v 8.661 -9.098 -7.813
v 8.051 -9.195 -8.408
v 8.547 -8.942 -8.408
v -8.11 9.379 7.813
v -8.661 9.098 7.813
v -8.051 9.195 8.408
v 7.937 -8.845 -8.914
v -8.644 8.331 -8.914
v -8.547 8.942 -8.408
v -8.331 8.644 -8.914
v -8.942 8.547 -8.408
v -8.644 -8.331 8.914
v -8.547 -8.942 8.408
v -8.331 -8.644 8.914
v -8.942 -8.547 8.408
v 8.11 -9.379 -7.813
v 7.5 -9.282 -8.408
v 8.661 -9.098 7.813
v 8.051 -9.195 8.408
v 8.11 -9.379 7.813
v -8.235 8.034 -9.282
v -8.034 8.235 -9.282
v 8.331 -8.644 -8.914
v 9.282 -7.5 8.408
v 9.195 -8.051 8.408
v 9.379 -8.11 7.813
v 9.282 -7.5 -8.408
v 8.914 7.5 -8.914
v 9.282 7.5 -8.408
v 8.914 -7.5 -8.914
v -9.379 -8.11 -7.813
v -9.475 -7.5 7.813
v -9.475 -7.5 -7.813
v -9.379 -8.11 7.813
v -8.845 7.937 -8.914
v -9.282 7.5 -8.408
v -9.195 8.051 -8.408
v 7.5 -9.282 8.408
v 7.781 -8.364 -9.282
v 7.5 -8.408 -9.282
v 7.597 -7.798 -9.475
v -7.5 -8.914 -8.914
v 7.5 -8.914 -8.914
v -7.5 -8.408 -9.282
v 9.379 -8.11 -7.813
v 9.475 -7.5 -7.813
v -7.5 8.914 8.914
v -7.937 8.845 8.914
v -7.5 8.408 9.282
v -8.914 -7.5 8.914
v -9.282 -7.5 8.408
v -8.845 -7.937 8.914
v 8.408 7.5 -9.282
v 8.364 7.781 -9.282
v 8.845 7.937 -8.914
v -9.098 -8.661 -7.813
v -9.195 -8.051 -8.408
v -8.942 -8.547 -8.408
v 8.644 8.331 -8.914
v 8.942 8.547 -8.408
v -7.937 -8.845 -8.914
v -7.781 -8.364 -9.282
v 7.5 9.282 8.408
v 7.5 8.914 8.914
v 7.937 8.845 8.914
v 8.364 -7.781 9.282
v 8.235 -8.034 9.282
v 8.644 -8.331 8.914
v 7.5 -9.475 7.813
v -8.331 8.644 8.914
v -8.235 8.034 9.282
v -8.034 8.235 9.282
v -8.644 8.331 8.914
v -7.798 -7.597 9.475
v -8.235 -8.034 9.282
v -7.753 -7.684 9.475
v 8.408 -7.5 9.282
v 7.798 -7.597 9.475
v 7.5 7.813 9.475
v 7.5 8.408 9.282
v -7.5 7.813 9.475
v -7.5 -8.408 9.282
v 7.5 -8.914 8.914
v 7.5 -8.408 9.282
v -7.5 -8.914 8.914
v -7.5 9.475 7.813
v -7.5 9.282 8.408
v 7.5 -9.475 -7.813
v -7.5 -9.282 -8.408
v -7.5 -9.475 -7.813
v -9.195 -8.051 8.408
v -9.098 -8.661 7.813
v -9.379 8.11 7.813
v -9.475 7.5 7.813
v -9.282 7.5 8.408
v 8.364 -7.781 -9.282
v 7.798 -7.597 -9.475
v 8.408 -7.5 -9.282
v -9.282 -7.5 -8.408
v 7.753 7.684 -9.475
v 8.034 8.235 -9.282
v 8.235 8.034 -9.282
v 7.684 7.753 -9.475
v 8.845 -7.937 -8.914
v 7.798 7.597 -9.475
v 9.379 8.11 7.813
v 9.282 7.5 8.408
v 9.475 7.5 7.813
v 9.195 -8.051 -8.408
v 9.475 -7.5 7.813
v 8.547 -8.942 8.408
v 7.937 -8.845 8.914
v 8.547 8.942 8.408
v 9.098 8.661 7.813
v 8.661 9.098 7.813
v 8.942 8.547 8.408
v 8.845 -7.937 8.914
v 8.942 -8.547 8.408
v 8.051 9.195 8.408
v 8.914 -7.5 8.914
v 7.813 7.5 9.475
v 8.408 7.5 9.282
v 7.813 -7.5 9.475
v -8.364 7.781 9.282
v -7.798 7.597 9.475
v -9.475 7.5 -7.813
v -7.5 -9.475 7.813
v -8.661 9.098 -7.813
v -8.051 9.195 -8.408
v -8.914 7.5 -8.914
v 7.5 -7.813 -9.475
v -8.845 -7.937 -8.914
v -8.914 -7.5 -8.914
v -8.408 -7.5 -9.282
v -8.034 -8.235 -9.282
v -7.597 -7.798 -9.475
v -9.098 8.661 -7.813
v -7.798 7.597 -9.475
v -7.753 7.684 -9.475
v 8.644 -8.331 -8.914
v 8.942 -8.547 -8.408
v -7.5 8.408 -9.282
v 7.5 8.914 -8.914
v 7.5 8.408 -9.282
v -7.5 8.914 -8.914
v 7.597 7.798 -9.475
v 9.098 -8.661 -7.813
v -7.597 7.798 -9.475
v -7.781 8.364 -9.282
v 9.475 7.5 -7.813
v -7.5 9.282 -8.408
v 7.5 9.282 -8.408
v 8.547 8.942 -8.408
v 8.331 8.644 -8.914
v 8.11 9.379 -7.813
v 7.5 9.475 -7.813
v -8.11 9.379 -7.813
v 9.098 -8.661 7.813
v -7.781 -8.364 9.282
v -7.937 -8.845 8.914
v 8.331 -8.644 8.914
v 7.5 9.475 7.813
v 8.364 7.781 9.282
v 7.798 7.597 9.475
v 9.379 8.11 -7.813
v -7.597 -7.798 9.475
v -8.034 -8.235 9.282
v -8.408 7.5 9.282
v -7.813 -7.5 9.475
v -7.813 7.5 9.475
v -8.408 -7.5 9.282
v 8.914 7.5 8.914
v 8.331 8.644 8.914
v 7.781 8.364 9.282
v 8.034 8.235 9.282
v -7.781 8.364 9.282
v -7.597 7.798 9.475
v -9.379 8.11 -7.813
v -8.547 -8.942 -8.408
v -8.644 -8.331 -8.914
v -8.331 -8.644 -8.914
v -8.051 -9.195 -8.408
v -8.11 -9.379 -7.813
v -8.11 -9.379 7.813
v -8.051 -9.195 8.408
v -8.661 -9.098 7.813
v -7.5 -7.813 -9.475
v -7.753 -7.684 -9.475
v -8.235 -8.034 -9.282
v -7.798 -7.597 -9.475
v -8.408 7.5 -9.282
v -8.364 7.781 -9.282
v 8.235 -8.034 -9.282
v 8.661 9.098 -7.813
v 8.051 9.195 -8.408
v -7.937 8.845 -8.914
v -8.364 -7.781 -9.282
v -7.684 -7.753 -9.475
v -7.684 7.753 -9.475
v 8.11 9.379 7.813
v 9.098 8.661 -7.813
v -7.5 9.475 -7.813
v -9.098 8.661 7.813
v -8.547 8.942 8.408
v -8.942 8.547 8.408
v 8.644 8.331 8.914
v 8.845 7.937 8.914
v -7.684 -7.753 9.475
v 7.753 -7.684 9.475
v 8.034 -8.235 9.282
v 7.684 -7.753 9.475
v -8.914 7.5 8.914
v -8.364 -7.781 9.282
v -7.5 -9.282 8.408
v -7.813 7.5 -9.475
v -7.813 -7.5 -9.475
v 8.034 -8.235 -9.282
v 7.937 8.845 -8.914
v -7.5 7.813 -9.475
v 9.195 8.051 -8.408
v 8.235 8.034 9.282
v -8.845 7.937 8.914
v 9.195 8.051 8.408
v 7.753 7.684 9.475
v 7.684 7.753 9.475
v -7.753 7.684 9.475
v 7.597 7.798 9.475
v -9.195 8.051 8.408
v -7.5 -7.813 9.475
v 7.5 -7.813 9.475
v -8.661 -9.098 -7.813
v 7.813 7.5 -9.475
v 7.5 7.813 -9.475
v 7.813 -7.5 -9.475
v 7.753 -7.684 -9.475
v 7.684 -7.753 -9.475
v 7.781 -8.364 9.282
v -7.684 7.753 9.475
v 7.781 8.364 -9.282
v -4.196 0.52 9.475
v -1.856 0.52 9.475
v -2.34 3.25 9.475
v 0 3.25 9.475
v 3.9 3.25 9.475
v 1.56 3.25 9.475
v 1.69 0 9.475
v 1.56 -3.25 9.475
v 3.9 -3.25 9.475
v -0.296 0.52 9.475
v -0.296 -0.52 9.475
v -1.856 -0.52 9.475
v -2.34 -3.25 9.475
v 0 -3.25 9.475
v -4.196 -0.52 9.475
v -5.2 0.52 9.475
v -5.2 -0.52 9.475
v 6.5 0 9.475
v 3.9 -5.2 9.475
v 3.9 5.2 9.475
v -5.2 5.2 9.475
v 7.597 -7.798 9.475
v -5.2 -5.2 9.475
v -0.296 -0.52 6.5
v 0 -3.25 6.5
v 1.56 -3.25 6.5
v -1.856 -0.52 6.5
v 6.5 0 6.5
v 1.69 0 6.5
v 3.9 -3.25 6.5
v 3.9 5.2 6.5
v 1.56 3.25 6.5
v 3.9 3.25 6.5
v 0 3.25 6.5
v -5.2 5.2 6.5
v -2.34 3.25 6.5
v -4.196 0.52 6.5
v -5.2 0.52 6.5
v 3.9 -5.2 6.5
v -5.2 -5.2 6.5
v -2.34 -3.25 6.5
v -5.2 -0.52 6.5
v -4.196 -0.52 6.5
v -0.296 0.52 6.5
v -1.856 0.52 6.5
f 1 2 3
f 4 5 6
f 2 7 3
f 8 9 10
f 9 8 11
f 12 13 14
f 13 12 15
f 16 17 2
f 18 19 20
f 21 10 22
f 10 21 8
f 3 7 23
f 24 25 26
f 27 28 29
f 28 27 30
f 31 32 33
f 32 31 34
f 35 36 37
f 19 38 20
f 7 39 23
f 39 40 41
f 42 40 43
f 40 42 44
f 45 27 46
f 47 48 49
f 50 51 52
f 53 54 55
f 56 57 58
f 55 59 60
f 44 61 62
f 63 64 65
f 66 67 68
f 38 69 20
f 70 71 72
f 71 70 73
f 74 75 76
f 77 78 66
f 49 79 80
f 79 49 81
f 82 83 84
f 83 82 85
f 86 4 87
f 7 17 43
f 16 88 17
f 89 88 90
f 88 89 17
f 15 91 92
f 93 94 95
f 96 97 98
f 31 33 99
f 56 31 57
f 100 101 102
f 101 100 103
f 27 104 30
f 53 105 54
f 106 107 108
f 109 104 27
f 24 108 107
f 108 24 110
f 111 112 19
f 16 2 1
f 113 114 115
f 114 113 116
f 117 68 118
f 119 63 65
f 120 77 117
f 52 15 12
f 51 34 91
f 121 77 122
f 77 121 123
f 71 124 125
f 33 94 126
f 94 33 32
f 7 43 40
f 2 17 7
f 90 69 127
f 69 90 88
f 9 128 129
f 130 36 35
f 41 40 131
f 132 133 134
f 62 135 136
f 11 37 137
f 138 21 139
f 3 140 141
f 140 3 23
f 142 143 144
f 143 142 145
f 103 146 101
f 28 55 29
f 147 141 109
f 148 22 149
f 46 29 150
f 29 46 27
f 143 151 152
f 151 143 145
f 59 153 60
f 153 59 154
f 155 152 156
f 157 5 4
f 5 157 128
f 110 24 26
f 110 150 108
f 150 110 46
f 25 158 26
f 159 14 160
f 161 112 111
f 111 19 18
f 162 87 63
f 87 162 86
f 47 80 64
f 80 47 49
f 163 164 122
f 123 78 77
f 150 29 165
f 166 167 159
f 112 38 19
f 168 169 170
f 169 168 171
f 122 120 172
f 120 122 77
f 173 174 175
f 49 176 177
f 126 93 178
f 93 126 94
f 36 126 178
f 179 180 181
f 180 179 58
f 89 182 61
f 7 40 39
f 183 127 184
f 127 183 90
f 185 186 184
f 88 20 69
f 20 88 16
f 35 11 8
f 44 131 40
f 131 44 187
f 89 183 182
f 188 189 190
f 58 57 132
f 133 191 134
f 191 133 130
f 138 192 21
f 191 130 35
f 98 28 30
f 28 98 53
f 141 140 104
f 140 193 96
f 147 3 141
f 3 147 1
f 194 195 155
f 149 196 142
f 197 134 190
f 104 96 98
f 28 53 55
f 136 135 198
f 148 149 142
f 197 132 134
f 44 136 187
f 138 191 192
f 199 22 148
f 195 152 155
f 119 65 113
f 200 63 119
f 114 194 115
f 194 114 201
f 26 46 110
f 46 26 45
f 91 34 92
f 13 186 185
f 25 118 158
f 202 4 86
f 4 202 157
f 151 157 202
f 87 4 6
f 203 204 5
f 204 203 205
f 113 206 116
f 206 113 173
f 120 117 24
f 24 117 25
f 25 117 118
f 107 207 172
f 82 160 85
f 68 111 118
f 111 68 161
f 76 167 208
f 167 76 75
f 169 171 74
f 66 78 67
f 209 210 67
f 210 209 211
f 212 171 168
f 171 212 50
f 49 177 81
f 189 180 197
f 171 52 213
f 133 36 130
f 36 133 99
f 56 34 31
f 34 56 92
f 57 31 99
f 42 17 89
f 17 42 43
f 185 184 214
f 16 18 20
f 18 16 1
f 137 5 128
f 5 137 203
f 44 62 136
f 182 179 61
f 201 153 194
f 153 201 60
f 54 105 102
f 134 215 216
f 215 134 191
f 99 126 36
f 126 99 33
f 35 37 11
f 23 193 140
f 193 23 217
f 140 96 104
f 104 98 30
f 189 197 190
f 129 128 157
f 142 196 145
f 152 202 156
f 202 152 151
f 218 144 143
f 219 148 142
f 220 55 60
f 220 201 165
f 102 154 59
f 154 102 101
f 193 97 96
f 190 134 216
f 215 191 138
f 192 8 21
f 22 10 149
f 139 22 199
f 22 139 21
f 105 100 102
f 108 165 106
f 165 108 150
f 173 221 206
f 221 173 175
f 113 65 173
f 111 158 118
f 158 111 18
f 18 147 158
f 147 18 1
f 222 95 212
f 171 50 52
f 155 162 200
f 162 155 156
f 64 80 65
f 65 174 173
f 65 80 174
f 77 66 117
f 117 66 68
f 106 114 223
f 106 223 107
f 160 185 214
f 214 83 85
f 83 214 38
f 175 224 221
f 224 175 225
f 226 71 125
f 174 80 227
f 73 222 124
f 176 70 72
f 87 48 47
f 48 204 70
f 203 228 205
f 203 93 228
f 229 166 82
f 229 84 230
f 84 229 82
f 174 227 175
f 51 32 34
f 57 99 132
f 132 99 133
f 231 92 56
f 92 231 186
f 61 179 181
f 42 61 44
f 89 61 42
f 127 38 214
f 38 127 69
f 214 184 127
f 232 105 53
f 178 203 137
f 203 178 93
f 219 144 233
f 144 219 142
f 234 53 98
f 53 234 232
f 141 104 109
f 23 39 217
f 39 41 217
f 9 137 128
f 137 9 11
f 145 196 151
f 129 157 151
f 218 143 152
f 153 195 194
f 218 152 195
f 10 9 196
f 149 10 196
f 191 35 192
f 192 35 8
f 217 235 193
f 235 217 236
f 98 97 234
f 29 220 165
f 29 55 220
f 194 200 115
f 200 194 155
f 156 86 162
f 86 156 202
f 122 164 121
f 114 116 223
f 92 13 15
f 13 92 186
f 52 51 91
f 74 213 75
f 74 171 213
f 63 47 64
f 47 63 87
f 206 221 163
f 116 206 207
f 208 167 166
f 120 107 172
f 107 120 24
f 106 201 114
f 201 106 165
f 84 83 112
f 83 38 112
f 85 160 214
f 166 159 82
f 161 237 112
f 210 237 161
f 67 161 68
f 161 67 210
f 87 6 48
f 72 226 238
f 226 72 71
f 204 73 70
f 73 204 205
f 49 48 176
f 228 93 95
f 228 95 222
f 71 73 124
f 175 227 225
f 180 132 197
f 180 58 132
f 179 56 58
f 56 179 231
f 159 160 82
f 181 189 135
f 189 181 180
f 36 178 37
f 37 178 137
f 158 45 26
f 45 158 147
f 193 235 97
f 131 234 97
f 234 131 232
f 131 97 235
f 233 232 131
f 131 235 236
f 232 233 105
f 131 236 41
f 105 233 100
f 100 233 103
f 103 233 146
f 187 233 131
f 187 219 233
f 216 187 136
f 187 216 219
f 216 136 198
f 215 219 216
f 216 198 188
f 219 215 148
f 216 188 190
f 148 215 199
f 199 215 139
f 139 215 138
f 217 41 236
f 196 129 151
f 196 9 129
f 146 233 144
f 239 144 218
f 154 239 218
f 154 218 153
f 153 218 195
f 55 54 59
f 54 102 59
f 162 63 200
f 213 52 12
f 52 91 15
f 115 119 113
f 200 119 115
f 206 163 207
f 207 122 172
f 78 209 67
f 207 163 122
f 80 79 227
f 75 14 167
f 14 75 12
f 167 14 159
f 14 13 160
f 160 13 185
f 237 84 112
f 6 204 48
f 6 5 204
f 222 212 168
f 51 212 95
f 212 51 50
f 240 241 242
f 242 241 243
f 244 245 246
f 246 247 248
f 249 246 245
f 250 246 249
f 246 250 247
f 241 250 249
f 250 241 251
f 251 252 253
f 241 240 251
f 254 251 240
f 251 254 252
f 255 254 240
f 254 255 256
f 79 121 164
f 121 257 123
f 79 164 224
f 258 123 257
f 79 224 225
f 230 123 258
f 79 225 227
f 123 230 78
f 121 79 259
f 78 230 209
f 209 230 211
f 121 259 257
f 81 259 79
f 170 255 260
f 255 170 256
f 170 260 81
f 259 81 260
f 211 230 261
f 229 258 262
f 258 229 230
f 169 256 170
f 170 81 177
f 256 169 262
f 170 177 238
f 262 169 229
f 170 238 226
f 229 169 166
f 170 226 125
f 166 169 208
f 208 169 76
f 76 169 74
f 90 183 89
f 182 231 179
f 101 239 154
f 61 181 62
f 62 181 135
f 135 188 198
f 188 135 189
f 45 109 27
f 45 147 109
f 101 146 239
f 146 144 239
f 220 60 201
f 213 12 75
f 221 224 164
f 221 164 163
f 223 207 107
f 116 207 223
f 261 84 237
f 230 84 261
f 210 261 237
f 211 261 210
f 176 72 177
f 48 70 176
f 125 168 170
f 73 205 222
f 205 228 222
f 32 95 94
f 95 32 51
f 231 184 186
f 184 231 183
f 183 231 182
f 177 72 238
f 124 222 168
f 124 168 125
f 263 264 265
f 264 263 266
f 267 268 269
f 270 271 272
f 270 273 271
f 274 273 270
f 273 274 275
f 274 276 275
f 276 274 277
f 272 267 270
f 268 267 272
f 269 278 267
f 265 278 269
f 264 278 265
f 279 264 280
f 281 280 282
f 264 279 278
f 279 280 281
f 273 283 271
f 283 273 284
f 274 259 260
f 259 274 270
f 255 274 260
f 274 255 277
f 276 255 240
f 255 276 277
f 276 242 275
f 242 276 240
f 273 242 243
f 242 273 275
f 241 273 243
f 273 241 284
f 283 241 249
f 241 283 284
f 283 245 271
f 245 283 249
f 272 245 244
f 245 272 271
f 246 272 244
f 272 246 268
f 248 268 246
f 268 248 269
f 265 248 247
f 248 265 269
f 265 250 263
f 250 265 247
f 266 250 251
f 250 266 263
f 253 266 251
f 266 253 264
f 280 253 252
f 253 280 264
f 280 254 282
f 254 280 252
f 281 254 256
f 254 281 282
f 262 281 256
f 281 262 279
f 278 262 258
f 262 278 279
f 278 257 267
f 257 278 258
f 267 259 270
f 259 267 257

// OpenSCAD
eps = 0.0001;
$fn = 20;

cube_side = 19;
chamfer = 2;
engrave = 3;

module cube() {
  hull()
    for (a = [-1, 1], b = [-1, 1], c = [-1, 1])
      scale([a, b, c])
        translate((cube_side/2 - chamfer) * [1, 1, 1])
          sphere(chamfer);
}

module bullet_2d() {
  width = 3;
  length = 9.5;
  gap = 0.8;
  
  translate([3 - length/2, 0]) {
    scale([2, 1]) {
      intersection() {
        circle(d=width);
        translate([-width/2, 0])
          square(width, center=true);
      }
    }
    
    translate([gap, -width/2])
      square([length - width - gap, width]);
  }
}

module sword_2d() {  
  // Blade and hilt.
  polygon([
    [1, -2],
    [1, 5.5],
    [0, 7.5],
    [-1, 5.5],
    [-1, -2],
  ]);
  
  // Crossguard.
  polygon([
    [-2, -0.5],
    [-2, -2],
    [2, -2],
    [2, -0.5],
  ]);
  for (a = [-1, 1])
    scale([a, 1, 1])
      translate([2, -1.25, 0])
        circle(r=0.75);
  
  // Scalloped grip.
  for (y = [0.4, 1.6, 2.8])
    translate([0, -y-2.4])
      square([2, 0.8], center=true);
}

module tooth_2d() {
  size = 3;
  
  translate([-1, 0]) {
    intersection() {
      polygon([
        [0, 0],
        [size, 0],
        [0, size],
      ]);
      
      square([2, size]);
    }
  }
}

module saw_2d() {
  circle(d=3);
  translate([0, -1.5])
    square([8, 3]);
  
  for (x = [0, 3, 6])
    translate([x, 2.2])
      tooth_2d();
  
  for (a = [60, 120])
    rotate([0, 0, a])
      translate([0, 2.2])
        tooth_2d();
}

module multi_bullet_2d() {
  translate([-1, 0])
    bullet_2d();
  translate([1, 4])
    bullet_2d();
  translate([1, -4])
    bullet_2d();
}

module bullet_sword_2d() {
  translate([0, 3])
    bullet_2d();
  
  translate([0, -3])
    rotate([0, 0, 90])
      sword_2d();
}

module bullet_saw_2d() {
  translate([0, 4.5])
    bullet_2d();
  
  translate([-2, -4])
    saw_2d();
}

module flame_2d() {
  translate([1.8, 0]) {
    scale([1.5, 1.5]) {
      rotate([0, 0, 90]) {
        difference() {
          union() {
            circle(r=3, $fn=30);
            translate([0.3, 3, 0]) {
              circle(r=1);
              polygon([[-0.9, 0.4], [0.9, 0.4], [0, 3]]);
            }
          }
          // Cut-out flames.
          translate([-1, -0.5, 0]) {
            circle(r=1);
            polygon([[-0.9, 0.4], [0.9, 0.4], [0, 5]]);
          }
          translate([1.5, 0.5, 0]) {
            circle(r=1);
            polygon([[-0.9, 0.4], [0.9, 0.4], [0, 3]]);
          }
        }
      }
    }
  }
}

module shield_2d() {
  translate([0, 0]) {
    scale([1.3, 1.3]) {
      rotate([0, 0, 90]) {
        difference() {
          polygon([
            [-4, -3],
            [-4, 4],
            [4, 4],
            [4, -3],
            [0, -5],
          ]);
          
          // Chevrons.
          for (a = [-1, 1])
            translate([0, 1 + 1.5*a, 0])
              polygon([
                [-2.5, -2.5],
                [-2.5, -0.7],
                [0, 1],
                [2.5, -0.7],
                [2.5, -2.5],
                [0, -0.8],
              ]);
          
          // Support.
          translate([0, 4])
            square([0.8, 10], center=true);
        }
      }
    }
  }
}

module preview() {
  difference() {
    cube();
    translate([0, 0, cube_side/2 - engrave])
      linear_extrude(engrave + 0.1)
        shield_2d();
  }
}

preview();
